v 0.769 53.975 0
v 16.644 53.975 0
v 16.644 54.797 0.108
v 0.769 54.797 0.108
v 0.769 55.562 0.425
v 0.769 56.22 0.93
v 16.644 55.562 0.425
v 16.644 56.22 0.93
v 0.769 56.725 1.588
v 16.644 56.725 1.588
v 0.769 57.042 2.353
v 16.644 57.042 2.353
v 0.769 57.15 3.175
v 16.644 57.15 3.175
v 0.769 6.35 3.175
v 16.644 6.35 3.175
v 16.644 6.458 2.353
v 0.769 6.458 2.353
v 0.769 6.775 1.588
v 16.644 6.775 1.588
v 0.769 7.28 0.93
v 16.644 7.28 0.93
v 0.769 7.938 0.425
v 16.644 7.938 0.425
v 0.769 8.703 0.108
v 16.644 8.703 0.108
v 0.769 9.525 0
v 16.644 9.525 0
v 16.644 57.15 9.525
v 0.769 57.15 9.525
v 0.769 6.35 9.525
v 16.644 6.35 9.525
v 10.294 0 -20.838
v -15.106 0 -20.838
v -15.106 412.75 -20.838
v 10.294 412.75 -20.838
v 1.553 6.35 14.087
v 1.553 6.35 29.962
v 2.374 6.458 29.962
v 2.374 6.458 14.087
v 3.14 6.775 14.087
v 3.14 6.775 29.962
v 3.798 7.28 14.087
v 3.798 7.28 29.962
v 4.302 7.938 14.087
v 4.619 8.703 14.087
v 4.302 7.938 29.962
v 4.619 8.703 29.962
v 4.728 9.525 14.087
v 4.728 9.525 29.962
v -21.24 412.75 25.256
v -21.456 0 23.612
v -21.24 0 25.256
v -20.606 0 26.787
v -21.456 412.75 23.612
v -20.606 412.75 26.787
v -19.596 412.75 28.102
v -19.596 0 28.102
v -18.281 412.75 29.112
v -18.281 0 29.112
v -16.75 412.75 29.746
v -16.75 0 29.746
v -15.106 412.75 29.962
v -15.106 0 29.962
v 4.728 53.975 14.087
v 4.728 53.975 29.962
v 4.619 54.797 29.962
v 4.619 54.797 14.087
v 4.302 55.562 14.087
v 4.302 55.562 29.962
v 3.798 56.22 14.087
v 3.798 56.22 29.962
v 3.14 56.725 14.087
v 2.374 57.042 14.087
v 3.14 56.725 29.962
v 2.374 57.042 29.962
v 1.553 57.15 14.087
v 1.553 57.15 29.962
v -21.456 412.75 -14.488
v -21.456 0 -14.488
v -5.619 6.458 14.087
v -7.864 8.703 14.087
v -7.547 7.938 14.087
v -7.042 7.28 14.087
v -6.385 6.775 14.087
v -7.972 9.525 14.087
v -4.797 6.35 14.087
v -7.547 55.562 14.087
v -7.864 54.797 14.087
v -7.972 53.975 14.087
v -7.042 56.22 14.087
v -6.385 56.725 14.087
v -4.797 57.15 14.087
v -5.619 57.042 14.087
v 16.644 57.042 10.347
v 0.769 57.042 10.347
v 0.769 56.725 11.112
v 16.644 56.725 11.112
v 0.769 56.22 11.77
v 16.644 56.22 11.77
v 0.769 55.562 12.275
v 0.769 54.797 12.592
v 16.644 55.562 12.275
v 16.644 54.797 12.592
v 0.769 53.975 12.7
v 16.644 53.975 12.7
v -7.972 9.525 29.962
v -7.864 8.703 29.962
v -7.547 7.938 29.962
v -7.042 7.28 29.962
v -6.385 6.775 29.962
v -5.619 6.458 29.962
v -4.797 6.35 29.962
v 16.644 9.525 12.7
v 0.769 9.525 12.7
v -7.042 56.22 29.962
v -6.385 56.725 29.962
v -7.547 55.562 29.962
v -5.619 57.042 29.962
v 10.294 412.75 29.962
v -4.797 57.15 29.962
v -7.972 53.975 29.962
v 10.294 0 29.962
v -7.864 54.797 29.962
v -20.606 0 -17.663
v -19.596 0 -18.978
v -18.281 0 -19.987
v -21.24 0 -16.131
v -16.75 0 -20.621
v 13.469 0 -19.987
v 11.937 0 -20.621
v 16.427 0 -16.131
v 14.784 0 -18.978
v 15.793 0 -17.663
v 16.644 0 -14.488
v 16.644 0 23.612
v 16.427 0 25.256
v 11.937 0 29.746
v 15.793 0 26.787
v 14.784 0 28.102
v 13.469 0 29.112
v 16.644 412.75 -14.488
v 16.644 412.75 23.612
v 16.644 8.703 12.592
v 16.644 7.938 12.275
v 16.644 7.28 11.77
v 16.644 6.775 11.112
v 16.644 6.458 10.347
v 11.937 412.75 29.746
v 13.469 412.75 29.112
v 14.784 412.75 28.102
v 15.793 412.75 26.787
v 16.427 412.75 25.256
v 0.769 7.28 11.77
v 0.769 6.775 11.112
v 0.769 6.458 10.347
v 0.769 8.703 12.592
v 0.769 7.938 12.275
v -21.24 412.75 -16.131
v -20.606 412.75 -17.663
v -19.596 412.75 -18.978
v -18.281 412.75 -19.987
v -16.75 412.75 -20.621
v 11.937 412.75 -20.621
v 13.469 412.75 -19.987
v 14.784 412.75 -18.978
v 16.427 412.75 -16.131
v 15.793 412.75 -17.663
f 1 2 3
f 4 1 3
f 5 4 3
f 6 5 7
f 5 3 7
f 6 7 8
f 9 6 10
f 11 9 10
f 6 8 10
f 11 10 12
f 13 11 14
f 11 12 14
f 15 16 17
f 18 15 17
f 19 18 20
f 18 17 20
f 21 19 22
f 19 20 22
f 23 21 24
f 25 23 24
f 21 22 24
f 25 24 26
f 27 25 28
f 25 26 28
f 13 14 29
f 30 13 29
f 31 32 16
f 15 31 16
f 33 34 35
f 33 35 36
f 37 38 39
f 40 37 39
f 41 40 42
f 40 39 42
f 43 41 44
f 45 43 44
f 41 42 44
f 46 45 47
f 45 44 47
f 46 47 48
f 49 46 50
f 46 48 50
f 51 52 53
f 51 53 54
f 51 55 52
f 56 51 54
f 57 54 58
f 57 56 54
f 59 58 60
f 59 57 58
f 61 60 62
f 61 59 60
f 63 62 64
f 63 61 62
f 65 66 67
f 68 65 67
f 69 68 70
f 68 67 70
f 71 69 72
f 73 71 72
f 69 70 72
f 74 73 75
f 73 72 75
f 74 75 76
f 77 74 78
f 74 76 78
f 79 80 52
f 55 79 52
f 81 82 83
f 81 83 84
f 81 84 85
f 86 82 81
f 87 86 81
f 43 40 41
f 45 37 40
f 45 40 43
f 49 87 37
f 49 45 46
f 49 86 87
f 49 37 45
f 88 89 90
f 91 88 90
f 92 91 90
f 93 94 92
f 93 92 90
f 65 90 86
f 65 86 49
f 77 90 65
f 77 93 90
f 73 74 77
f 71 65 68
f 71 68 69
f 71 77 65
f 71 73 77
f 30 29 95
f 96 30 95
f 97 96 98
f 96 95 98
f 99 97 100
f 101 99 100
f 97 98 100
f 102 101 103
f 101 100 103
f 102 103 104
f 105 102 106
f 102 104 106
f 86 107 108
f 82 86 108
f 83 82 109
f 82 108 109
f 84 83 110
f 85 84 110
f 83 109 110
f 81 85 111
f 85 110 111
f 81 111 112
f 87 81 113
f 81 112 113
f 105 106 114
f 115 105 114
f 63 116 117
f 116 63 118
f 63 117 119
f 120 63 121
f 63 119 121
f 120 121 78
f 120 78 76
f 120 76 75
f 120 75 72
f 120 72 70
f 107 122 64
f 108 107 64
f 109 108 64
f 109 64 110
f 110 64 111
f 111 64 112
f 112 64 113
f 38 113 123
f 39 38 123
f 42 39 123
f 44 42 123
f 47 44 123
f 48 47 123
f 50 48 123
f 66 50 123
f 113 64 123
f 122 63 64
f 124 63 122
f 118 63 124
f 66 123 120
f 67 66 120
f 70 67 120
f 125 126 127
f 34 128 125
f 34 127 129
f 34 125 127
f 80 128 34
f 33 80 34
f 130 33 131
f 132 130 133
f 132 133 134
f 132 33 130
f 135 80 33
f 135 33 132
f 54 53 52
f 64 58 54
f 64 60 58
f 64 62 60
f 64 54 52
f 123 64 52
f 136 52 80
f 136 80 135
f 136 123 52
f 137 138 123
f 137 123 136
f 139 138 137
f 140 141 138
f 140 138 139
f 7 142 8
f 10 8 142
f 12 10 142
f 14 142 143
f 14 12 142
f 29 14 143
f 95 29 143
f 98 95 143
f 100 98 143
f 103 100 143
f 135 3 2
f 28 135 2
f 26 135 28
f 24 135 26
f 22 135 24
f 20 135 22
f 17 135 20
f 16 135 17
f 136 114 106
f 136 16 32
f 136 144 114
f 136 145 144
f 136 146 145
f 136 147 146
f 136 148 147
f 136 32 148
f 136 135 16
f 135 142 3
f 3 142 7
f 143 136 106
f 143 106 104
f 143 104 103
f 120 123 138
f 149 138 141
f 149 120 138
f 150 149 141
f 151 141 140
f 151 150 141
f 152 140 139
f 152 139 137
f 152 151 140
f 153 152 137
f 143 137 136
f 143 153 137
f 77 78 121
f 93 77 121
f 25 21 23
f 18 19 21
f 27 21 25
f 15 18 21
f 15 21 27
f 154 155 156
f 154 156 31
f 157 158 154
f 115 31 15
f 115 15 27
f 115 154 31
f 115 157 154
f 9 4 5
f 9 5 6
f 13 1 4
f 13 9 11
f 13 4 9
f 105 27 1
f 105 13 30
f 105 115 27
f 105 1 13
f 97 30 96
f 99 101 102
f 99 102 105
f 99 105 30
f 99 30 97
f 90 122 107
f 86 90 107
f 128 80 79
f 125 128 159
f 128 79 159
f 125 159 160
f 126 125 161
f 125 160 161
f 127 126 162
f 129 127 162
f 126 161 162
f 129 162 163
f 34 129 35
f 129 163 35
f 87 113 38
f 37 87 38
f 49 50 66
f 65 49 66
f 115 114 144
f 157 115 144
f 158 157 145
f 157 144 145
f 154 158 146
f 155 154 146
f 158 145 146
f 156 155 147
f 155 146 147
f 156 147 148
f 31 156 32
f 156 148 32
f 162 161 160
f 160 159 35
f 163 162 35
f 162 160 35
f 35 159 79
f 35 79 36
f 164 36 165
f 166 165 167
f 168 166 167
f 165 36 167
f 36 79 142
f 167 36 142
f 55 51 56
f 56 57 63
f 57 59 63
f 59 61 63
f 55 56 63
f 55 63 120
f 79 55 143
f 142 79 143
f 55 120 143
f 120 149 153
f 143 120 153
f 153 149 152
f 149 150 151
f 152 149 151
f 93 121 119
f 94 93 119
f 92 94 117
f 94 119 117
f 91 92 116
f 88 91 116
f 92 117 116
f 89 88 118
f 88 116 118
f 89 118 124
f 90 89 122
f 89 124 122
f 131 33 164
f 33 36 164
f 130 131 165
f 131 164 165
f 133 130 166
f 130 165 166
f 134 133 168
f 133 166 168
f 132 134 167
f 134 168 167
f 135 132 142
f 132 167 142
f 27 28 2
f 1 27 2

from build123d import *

# Parameters (mm, degrees)
F0_W     = 38.1
F0_H     = 50.8
F1_DEPTH = 412.75
F3_DEPTH = 15.875
F5_DEPTH = 15.875
F6_R     = 6.35


with BuildPart() as f1:
    # F0 (on Front) → F1 (new body)
    with BuildSketch(Plane.XZ):
        with Locations((-2.406317, 4.562353)):
            Rectangle(F0_W, F0_H)
    extrude(amount=-F1_DEPTH)

    # F2 (on face) → F3 (cut)
    with BuildSketch(Plane.YZ.offset(16.643683)):
        with BuildLine():
            Line((53.975, 12.7), (9.525, 12.7))
            ThreePointArc((9.525, 12.7), (7.279936, 11.770064), (6.35, 9.525))
            Line((6.35, 9.525), (6.35, 3.175))
            ThreePointArc((6.35, 3.175), (7.279936, 0.929936), (9.525, 0))
            Line((9.525, 0), (53.975, 0))
            ThreePointArc((53.975, 0), (56.220064, 0.929936), (57.15, 3.175))
            Line((57.15, 3.175), (57.15, 9.525))
            ThreePointArc((57.15, 9.525), (56.220064, 11.770064), (53.975, 12.7))
        make_face()
    extrude(amount=-F3_DEPTH, mode=Mode.SUBTRACT)

    # F4 (on face) → F5 (cut)
    with BuildSketch(Plane.XY.offset(29.962353)):
        with BuildLine():
            ThreePointArc((-4.797424, 57.15), (-7.042488, 56.220064), (-7.972424, 53.975))
            Line((-7.972424, 53.975), (-7.972424, 9.525))
            ThreePointArc((-7.972424, 9.525), (-7.042488, 7.279936), (-4.797424, 6.35))
            Line((-4.797424, 6.35), (1.552576, 6.35))
            ThreePointArc((1.552576, 6.35), (3.79764, 7.279936), (4.727576, 9.525))
            Line((4.727576, 9.525), (4.727576, 53.975))
            ThreePointArc((4.727576, 53.975), (3.79764, 56.220064), (1.552576, 57.15))
            Line((1.552576, 57.15), (-4.797424, 57.15))
        make_face()
    extrude(amount=-F5_DEPTH, mode=Mode.SUBTRACT)

    # F6
    f6_edges = [f1.edges().sort_by_distance(p)[0] for p in [
        (16.643683, 206.375, -20.837647),
        (-21.456317, 206.375, -20.837647),
        (16.643683, 206.375, 29.962353),
        (-21.456317, 206.375, 29.962353),
    ]]
    fillet(f6_edges, radius=F6_R)


solid = f1.part
